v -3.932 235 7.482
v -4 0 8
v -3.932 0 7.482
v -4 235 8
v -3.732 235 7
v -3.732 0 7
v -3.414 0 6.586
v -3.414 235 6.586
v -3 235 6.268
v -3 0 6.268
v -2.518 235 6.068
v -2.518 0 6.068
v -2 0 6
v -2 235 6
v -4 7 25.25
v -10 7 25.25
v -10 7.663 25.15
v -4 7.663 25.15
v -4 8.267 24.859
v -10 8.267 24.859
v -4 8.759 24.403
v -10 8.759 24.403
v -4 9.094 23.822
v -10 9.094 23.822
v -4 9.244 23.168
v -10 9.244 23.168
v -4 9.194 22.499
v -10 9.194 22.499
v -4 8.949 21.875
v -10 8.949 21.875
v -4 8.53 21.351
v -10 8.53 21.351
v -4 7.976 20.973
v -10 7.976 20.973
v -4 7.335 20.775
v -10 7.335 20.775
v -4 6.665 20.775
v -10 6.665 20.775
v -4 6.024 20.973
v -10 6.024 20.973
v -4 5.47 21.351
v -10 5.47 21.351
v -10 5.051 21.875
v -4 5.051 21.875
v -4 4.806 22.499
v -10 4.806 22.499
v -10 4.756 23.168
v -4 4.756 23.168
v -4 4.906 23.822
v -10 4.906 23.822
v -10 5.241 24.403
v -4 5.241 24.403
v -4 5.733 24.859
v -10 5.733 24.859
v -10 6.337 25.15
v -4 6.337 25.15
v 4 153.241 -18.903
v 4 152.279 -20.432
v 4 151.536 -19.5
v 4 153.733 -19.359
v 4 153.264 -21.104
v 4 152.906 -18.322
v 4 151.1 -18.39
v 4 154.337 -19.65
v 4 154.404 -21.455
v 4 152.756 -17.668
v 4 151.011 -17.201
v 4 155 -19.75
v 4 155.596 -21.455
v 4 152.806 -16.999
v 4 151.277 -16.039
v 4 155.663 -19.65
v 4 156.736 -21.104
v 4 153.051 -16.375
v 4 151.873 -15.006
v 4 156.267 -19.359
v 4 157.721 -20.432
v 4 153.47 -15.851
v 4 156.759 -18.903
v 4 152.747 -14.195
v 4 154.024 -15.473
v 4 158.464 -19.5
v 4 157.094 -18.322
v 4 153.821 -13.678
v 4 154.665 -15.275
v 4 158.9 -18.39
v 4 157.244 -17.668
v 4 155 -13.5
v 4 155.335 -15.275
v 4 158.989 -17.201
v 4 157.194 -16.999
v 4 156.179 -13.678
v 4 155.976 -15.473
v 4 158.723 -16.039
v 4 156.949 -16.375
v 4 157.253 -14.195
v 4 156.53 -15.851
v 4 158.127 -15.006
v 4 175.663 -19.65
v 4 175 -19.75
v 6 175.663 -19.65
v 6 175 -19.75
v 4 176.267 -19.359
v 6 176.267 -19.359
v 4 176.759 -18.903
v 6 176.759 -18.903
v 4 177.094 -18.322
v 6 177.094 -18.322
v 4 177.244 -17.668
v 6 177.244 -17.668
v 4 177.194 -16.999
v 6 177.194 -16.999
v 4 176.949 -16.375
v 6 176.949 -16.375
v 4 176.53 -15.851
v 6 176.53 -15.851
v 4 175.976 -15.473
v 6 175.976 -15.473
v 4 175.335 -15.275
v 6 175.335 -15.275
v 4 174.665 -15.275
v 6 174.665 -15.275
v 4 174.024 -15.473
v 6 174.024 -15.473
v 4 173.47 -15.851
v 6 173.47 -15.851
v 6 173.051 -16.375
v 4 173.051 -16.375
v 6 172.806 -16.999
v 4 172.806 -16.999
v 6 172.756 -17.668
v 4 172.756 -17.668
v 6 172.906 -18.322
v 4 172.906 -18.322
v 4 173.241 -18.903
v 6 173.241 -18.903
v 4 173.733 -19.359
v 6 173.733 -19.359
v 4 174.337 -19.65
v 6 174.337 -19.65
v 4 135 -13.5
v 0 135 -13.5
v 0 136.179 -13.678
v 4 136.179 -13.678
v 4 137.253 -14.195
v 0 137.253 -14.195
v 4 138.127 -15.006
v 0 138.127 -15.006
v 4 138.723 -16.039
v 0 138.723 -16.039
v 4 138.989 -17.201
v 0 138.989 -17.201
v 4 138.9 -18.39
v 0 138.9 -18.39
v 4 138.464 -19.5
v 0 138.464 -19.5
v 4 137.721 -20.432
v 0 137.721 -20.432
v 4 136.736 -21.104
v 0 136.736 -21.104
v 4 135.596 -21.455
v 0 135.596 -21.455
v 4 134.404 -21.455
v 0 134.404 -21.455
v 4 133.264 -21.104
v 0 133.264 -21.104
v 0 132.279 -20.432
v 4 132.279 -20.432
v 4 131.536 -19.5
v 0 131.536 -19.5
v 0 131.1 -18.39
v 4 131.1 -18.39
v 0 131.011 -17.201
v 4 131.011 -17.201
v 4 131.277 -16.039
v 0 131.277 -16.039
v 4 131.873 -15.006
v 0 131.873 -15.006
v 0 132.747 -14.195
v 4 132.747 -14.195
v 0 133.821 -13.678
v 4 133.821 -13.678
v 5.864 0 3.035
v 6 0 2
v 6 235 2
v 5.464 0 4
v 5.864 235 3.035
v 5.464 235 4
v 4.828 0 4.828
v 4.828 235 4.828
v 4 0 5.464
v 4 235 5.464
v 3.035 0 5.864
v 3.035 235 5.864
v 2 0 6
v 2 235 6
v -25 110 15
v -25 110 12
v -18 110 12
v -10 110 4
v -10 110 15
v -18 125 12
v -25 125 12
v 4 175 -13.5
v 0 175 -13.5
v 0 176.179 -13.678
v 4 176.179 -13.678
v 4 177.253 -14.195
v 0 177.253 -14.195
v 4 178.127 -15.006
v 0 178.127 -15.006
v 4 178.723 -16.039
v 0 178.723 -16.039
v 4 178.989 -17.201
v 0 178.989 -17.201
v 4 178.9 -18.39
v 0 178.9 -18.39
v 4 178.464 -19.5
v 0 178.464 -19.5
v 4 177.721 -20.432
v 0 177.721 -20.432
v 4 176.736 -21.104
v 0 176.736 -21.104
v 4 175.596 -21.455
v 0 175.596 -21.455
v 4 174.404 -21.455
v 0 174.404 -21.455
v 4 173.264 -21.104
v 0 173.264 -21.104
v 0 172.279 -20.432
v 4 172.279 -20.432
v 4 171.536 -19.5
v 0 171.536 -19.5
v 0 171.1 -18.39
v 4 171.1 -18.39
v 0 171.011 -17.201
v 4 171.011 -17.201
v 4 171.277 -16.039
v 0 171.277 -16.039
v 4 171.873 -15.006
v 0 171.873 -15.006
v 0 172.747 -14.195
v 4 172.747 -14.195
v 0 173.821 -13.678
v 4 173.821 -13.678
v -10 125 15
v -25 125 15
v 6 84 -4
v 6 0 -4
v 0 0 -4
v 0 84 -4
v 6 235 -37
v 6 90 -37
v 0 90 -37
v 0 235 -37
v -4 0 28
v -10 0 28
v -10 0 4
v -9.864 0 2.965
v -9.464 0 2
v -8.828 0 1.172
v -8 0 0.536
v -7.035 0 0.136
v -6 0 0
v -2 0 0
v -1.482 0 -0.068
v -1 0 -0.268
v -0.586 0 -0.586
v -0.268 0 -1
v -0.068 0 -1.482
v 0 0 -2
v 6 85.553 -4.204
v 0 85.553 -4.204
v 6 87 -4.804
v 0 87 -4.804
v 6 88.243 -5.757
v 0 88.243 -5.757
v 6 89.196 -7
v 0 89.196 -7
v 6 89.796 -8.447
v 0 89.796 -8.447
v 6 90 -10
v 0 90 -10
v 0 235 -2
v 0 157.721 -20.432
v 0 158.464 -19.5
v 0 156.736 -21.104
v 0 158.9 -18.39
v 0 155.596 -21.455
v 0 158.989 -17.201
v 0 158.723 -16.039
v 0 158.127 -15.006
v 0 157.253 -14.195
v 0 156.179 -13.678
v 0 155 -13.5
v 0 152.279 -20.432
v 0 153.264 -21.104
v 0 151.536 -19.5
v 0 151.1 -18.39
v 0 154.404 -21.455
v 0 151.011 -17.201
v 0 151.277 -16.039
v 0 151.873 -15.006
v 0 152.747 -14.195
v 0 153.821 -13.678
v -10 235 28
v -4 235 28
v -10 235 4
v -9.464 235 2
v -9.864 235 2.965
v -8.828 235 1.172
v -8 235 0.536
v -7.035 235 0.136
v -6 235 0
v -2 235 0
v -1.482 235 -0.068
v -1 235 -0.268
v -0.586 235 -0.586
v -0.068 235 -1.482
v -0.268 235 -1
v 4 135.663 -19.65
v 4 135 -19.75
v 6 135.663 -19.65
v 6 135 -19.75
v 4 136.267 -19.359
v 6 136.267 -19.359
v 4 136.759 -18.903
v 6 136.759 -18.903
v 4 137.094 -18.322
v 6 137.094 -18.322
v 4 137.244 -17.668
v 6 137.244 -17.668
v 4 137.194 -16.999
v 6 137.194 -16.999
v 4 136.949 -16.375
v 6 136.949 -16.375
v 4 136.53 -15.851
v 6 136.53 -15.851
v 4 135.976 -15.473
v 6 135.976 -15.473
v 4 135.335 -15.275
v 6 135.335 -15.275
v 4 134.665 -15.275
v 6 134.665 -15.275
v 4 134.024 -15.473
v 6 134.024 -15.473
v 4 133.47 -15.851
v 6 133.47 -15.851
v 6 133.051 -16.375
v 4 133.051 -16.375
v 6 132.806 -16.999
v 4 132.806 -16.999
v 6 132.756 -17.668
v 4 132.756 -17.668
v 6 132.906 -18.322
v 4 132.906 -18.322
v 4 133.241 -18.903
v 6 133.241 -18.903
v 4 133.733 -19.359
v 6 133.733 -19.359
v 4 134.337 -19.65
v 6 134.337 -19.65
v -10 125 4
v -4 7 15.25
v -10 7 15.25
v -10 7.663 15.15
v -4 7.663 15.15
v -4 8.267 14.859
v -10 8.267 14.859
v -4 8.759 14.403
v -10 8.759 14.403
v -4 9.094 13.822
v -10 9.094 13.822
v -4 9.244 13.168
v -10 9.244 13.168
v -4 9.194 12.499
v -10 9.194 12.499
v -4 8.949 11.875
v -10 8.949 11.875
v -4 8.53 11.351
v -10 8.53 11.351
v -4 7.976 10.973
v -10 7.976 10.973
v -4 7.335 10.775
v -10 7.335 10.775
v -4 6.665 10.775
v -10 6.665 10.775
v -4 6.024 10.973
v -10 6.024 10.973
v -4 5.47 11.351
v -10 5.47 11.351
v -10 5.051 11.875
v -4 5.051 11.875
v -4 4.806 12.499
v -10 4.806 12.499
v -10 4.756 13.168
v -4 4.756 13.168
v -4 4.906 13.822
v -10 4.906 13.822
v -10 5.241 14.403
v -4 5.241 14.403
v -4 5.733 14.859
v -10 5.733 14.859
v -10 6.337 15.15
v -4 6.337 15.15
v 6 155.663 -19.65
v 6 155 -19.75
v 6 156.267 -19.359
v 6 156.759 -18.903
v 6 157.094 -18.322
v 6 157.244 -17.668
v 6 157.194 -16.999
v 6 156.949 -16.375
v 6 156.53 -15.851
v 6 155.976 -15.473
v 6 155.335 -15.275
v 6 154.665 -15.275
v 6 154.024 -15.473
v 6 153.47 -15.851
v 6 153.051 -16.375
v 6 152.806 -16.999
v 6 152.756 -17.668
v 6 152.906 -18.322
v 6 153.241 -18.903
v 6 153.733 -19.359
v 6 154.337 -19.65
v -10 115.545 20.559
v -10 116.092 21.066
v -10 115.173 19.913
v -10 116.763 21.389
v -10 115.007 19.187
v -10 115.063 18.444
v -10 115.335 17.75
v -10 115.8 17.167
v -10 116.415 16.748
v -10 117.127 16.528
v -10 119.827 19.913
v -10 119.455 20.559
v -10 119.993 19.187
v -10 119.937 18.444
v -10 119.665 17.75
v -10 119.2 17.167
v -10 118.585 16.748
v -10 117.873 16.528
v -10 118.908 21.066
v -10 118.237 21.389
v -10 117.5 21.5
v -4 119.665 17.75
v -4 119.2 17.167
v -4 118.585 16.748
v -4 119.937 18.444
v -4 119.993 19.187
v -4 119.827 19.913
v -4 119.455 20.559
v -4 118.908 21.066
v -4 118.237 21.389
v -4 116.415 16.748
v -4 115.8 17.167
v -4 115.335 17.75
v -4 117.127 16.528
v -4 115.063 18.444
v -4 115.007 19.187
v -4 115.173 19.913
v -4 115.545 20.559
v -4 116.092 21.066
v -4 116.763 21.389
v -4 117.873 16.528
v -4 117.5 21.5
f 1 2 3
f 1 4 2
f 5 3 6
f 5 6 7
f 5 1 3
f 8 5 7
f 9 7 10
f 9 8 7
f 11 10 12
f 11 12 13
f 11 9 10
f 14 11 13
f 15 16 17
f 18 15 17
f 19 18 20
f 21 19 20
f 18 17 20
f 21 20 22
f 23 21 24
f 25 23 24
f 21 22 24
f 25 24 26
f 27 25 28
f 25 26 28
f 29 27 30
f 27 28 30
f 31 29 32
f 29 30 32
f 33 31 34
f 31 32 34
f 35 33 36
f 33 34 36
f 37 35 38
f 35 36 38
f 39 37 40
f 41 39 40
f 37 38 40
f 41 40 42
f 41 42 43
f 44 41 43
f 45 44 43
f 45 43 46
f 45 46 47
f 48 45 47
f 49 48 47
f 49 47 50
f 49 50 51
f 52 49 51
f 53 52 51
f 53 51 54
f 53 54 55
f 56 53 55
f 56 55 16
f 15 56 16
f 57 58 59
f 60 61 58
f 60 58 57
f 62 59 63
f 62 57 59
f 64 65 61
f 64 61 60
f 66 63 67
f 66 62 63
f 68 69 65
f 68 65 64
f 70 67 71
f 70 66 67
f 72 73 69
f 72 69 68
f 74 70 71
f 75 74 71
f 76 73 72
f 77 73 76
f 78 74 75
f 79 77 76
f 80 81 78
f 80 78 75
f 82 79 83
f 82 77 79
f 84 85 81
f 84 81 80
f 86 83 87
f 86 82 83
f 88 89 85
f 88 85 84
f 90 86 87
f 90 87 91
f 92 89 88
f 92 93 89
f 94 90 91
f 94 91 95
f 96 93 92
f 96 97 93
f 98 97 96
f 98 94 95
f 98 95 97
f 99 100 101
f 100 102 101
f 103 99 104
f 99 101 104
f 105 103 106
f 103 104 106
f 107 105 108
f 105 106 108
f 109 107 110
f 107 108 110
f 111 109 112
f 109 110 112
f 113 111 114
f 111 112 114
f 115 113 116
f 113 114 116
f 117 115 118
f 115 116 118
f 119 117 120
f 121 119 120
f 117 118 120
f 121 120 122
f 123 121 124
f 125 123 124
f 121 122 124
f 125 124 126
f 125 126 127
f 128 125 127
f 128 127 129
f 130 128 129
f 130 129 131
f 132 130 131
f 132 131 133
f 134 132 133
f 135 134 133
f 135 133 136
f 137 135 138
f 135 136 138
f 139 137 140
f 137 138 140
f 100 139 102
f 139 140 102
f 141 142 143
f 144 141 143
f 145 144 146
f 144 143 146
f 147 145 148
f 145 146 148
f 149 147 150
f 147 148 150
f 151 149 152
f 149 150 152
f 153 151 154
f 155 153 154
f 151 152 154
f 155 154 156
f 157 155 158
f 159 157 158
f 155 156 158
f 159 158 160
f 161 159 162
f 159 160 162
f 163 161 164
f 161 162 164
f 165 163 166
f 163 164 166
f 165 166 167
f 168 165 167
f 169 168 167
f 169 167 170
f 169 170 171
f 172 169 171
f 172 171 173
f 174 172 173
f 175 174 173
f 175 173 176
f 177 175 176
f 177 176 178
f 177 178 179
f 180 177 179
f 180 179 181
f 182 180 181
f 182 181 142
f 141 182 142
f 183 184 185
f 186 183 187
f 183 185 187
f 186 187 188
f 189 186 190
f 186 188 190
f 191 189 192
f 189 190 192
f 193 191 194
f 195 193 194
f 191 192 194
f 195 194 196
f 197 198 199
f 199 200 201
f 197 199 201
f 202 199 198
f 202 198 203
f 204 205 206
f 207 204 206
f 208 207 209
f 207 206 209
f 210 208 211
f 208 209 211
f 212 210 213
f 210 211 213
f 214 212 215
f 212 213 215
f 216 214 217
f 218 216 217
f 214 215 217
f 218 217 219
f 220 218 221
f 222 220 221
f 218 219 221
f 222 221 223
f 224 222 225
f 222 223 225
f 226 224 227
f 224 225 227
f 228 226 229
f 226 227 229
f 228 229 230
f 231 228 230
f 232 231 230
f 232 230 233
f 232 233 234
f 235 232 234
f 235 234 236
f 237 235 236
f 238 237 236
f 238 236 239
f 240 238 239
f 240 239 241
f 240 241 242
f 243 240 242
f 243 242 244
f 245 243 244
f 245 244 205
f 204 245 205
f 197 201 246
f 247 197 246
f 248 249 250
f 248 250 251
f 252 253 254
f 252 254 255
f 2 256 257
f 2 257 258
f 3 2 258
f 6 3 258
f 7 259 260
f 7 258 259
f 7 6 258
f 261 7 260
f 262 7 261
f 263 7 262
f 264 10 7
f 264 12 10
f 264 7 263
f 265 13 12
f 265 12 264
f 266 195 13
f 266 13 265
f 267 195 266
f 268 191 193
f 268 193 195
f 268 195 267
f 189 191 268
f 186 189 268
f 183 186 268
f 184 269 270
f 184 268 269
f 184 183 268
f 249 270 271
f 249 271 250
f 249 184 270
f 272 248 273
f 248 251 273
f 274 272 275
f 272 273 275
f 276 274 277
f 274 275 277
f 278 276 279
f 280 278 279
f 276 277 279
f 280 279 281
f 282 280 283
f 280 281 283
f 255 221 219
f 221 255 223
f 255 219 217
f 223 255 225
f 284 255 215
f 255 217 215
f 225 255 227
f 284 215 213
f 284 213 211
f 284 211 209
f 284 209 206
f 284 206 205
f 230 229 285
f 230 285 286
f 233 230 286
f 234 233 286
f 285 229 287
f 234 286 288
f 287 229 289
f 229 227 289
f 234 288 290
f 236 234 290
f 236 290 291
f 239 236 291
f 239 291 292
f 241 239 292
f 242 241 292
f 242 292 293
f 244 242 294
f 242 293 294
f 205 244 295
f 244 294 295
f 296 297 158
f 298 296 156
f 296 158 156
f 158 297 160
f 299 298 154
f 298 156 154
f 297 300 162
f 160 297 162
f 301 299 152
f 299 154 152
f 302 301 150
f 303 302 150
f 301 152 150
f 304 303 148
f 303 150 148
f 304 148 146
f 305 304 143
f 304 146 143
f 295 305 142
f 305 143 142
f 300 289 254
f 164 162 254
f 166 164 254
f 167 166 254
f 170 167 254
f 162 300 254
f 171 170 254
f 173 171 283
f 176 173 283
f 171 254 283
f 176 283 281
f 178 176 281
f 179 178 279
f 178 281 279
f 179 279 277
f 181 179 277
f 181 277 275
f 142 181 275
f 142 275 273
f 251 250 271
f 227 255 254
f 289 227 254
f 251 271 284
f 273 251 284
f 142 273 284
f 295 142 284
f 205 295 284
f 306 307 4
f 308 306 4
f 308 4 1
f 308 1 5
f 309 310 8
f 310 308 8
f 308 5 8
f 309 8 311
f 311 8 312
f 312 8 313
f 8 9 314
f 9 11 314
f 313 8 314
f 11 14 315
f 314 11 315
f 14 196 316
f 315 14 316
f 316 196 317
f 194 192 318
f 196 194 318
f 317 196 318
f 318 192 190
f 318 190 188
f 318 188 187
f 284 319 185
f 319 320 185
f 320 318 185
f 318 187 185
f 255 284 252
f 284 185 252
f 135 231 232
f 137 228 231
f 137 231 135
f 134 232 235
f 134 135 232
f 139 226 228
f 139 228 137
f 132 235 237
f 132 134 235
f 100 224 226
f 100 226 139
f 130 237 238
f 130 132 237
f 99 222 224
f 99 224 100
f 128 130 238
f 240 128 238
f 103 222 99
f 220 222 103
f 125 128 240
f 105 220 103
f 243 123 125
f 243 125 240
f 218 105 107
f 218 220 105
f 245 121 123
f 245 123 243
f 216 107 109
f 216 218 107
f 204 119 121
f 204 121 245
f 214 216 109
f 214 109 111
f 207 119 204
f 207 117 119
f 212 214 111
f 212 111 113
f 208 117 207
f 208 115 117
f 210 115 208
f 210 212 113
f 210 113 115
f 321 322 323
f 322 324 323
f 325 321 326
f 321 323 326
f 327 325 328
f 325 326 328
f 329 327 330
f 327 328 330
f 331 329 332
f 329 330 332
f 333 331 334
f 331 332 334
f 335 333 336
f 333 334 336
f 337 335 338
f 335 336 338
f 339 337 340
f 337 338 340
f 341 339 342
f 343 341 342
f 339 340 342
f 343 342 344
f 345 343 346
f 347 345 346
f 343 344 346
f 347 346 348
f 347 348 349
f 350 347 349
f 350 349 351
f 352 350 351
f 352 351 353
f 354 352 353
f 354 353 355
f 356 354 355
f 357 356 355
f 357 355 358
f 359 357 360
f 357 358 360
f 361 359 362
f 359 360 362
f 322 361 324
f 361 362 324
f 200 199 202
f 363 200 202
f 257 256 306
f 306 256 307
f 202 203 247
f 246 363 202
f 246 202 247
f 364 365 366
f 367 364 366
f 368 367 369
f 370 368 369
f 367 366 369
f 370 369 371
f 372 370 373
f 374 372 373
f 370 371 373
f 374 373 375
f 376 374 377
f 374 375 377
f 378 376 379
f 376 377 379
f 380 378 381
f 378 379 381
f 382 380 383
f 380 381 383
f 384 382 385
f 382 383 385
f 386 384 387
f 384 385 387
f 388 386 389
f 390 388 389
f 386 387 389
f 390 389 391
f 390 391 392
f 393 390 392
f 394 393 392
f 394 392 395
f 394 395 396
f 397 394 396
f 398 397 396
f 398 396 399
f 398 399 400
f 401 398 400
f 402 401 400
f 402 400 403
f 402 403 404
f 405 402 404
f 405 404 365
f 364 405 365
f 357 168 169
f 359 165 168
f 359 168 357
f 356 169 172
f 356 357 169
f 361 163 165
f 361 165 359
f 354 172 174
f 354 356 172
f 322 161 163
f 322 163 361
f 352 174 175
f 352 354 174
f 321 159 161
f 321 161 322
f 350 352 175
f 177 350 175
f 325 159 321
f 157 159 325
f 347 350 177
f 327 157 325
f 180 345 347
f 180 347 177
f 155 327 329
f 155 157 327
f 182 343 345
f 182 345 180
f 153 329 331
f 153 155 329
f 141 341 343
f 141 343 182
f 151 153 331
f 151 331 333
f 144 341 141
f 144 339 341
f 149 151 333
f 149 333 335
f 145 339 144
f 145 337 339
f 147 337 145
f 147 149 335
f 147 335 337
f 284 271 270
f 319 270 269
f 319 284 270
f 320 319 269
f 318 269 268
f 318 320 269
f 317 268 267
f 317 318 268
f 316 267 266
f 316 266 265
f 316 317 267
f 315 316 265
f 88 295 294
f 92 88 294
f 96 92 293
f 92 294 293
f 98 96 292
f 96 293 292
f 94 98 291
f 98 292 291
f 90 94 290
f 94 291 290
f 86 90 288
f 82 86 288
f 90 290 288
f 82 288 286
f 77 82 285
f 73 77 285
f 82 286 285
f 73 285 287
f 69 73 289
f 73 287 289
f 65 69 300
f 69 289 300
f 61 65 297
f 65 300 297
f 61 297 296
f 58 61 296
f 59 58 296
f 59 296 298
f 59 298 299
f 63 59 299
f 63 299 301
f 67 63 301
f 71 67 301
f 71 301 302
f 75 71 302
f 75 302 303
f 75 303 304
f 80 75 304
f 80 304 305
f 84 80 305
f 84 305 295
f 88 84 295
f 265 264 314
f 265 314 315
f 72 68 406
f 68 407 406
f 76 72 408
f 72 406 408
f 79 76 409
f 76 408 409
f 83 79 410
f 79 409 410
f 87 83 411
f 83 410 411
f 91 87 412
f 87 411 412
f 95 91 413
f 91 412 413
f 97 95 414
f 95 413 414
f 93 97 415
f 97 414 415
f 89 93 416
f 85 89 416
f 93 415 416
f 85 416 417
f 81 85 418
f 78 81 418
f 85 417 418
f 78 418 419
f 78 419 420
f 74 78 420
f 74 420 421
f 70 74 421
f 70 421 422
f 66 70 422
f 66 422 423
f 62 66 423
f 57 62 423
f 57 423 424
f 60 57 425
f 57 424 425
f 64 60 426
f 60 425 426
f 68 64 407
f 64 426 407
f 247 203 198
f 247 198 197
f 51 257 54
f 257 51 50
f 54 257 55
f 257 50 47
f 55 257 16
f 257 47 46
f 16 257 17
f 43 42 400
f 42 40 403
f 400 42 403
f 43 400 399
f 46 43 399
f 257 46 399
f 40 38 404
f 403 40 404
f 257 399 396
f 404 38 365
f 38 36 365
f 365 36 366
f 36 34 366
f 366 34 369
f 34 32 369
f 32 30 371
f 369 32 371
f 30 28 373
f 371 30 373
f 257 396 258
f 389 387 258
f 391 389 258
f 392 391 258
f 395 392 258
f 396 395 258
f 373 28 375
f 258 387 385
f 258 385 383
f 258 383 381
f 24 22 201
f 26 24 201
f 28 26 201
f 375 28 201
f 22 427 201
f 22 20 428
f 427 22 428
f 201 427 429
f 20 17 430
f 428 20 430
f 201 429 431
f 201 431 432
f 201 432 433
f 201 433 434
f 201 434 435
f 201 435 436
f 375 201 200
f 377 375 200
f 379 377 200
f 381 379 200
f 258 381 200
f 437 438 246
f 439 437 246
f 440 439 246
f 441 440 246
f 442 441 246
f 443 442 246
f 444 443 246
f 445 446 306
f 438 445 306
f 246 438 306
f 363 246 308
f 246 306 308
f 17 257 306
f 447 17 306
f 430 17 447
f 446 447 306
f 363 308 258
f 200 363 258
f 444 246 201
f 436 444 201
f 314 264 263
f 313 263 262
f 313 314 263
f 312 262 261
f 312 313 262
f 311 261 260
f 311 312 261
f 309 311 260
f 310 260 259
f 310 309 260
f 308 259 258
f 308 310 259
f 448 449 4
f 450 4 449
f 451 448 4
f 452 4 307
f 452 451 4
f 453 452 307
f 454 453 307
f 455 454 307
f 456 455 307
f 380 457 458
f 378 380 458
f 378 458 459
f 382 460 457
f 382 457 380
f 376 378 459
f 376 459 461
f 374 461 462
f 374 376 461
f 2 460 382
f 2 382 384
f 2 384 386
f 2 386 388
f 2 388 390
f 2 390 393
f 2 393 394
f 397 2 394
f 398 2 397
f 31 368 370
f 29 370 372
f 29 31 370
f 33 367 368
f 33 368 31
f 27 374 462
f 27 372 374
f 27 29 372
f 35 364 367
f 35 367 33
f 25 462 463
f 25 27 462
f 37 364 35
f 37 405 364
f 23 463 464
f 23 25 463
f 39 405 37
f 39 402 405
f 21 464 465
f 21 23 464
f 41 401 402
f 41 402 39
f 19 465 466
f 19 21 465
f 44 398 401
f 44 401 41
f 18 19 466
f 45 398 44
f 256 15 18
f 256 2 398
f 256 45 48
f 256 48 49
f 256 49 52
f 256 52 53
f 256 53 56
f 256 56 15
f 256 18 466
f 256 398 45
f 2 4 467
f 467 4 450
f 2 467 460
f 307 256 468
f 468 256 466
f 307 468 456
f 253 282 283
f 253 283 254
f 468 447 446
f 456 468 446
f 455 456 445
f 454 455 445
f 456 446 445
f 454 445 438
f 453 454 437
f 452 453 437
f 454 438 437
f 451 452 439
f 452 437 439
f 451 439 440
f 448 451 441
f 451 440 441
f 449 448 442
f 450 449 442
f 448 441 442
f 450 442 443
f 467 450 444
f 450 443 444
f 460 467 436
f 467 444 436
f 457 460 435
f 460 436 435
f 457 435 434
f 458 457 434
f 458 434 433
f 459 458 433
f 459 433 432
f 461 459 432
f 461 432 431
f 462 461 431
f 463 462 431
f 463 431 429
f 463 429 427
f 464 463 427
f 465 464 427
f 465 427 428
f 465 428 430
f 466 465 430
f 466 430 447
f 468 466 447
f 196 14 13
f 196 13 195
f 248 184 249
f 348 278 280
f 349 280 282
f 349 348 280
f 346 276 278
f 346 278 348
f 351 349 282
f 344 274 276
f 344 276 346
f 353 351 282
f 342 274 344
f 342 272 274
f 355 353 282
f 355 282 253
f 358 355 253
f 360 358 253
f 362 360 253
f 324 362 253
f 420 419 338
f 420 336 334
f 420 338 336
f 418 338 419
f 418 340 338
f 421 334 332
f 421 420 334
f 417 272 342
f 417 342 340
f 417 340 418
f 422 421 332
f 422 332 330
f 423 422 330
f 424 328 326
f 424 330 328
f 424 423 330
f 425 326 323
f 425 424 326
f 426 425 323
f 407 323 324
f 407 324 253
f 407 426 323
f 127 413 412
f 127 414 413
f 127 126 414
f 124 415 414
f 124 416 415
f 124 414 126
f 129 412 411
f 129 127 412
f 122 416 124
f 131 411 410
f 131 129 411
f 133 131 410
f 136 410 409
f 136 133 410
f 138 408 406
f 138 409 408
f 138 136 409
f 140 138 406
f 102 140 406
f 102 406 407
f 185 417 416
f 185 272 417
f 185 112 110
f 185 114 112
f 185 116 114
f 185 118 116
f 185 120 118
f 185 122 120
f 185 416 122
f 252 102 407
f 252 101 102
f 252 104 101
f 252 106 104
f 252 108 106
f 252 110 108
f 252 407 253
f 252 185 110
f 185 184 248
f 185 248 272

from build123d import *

# Parameters (mm, degrees)
SCHIZZO1_W                                           = 65
SCHIZZO1_H                                           = 235
ESTRUSIONE_ESTRUSIONE1_DEPTH                         = 16
SCHIZZO2_W                                           = 10
SCHIZZO2_H                                           = 37
TAGLIO_ESTRUSIONE1_DEPTH                             = 239.105018847
SCHIZZO3_W                                           = 33
SCHIZZO3_H                                           = 90
TAGLIO_ESTRUSIONE2_DEPTH                             = 239.432380351
SCHIZZO4_W                                           = 10
SCHIZZO4_H                                           = 22
TAGLIO_ESTRUSIONE3_DEPTH                             = 239.105018847
FORO_LAMATO_PER_VITE_M4_A_TESTA_ESAGONAL_D           = 4.5
FORO_LAMATO_PER_VITE_M4_A_TESTA_ESAGONAL_CBORE_D     = 8
FORO_LAMATO_PER_VITE_M4_A_TESTA_ESAGONAL_CBORE_DEPTH = 4
RACCORDO1_R                                          = 2
RACCORDO2_R                                          = 4
RACCORDO3_R                                          = 6
FORO_PER_VITE_M4_1_D                                 = 4.5
FORO_PER_VITE_M4_1_DEPTH                             = 188
FORO_PER_VITE_M4_1_TIP                               = 1.351936393
SCHIZZO10_W                                          = 3
SCHIZZO10_H                                          = 15
ESTRUSIONE_ESTRUSIONE2_DEPTH                         = 15
SCHIZZO11_R                                          = 2.5
TAGLIO_ESTRUSIONE4_DEPTH                             = 10
SMUSSO1_SIZE                                         = 8


with BuildPart() as part:
    # Schizzo1 → Estrusione-Estrusione1 (new body)
    with BuildSketch(Plane(origin=(6, 0, 0), x_dir=(0, 0, -1), z_dir=(1, 0, 0))):
        with Locations((4.5, 117.5)):
            Rectangle(SCHIZZO1_W, SCHIZZO1_H)
    extrude(amount=-ESTRUSIONE_ESTRUSIONE1_DEPTH)

    # Schizzo2 → Taglio-Estrusione1 (cut, through all)
    with BuildSketch(Plane.XZ):
        with Locations((-5, -18.5)):
            Rectangle(SCHIZZO2_W, SCHIZZO2_H)
    extrude(amount=-TAGLIO_ESTRUSIONE1_DEPTH, mode=Mode.SUBTRACT)

    # Schizzo3 → Taglio-Estrusione2 (cut, through all)
    with BuildSketch(Plane(origin=(6, 0, 0), x_dir=(0, 0, -1), z_dir=(1, 0, 0))):
        with Locations((20.5, 45)):
            Rectangle(SCHIZZO3_W, SCHIZZO3_H)
    extrude(amount=-TAGLIO_ESTRUSIONE2_DEPTH, mode=Mode.SUBTRACT)

    # Schizzo4 → Taglio-Estrusione3 (cut, through all)
    with BuildSketch(Plane.XZ):
        with Locations((1, 17)):
            Rectangle(SCHIZZO4_W, SCHIZZO4_H)
    extrude(amount=-TAGLIO_ESTRUSIONE3_DEPTH, mode=Mode.SUBTRACT)

    # Foro lamato per Vite M4 a testa esagonale-1 (through all)
    with Locations(Plane.ZY):
        with Locations((-17.5, 175), (-17.5, 155), (-17.5, 135)):
            CounterBoreHole(FORO_LAMATO_PER_VITE_M4_A_TESTA_ESAGONAL_D / 2, FORO_LAMATO_PER_VITE_M4_A_TESTA_ESAGONAL_CBORE_D / 2, FORO_LAMATO_PER_VITE_M4_A_TESTA_ESAGONAL_CBORE_DEPTH)

    # Raccordo1
    raccordo1_edges = [part.edges().sort_by_distance(p)[0] for p in [
        (0, 117.5, 0),
        (-4, 117.5, 6),
    ]]
    fillet(raccordo1_edges, radius=RACCORDO1_R)

    # Raccordo2
    raccordo2_edges = [part.edges().sort_by_distance(p)[0] for p in [
        (-10, 117.5, 0),
        (6, 117.5, 6),
    ]]
    fillet(raccordo2_edges, radius=RACCORDO2_R)

    # Raccordo3
    raccordo3_edges = [part.edges().sort_by_distance(p)[0] for p in [
        (3, 90, -4),
    ]]
    fillet(raccordo3_edges, radius=RACCORDO3_R)

    # Foro per Vite M4-1
    with Locations(Plane(origin=(-4, 0, 0), x_dir=(0, 0, -1), z_dir=(1, 0, 0))):
        with Locations((-23, 7), (-13, 7)):
            Hole(FORO_PER_VITE_M4_1_D / 2, depth=FORO_PER_VITE_M4_1_DEPTH)
            with Locations((0, 0, -(FORO_PER_VITE_M4_1_DEPTH + FORO_PER_VITE_M4_1_TIP / 2))):  # 118° drill point
                Cone(0, FORO_PER_VITE_M4_1_D / 2, FORO_PER_VITE_M4_1_TIP, mode=Mode.SUBTRACT)

    # Schizzo10 → Estrusione-Estrusione2 (add)
    with BuildSketch(Plane.ZY.offset(10)):
        with Locations((13.5, 117.5)):
            Rectangle(SCHIZZO10_W, SCHIZZO10_H)
    extrude(amount=ESTRUSIONE_ESTRUSIONE2_DEPTH)

    # Schizzo11 → Taglio-Estrusione4 (cut)
    with BuildSketch(Plane.ZY.offset(10)):
        with Locations((19, 117.5)):
            Circle(SCHIZZO11_R)
    extrude(amount=-TAGLIO_ESTRUSIONE4_DEPTH, mode=Mode.SUBTRACT)

    # Smusso1
    smusso1_edges = [part.edges().sort_by_distance(p)[0] for p in [
        (-10, 117.5, 12),
    ]]
    chamfer(smusso1_edges, length=SMUSSO1_SIZE - 0.0001)  # a hair under: the kernel refuses the full size


solid = part.part
